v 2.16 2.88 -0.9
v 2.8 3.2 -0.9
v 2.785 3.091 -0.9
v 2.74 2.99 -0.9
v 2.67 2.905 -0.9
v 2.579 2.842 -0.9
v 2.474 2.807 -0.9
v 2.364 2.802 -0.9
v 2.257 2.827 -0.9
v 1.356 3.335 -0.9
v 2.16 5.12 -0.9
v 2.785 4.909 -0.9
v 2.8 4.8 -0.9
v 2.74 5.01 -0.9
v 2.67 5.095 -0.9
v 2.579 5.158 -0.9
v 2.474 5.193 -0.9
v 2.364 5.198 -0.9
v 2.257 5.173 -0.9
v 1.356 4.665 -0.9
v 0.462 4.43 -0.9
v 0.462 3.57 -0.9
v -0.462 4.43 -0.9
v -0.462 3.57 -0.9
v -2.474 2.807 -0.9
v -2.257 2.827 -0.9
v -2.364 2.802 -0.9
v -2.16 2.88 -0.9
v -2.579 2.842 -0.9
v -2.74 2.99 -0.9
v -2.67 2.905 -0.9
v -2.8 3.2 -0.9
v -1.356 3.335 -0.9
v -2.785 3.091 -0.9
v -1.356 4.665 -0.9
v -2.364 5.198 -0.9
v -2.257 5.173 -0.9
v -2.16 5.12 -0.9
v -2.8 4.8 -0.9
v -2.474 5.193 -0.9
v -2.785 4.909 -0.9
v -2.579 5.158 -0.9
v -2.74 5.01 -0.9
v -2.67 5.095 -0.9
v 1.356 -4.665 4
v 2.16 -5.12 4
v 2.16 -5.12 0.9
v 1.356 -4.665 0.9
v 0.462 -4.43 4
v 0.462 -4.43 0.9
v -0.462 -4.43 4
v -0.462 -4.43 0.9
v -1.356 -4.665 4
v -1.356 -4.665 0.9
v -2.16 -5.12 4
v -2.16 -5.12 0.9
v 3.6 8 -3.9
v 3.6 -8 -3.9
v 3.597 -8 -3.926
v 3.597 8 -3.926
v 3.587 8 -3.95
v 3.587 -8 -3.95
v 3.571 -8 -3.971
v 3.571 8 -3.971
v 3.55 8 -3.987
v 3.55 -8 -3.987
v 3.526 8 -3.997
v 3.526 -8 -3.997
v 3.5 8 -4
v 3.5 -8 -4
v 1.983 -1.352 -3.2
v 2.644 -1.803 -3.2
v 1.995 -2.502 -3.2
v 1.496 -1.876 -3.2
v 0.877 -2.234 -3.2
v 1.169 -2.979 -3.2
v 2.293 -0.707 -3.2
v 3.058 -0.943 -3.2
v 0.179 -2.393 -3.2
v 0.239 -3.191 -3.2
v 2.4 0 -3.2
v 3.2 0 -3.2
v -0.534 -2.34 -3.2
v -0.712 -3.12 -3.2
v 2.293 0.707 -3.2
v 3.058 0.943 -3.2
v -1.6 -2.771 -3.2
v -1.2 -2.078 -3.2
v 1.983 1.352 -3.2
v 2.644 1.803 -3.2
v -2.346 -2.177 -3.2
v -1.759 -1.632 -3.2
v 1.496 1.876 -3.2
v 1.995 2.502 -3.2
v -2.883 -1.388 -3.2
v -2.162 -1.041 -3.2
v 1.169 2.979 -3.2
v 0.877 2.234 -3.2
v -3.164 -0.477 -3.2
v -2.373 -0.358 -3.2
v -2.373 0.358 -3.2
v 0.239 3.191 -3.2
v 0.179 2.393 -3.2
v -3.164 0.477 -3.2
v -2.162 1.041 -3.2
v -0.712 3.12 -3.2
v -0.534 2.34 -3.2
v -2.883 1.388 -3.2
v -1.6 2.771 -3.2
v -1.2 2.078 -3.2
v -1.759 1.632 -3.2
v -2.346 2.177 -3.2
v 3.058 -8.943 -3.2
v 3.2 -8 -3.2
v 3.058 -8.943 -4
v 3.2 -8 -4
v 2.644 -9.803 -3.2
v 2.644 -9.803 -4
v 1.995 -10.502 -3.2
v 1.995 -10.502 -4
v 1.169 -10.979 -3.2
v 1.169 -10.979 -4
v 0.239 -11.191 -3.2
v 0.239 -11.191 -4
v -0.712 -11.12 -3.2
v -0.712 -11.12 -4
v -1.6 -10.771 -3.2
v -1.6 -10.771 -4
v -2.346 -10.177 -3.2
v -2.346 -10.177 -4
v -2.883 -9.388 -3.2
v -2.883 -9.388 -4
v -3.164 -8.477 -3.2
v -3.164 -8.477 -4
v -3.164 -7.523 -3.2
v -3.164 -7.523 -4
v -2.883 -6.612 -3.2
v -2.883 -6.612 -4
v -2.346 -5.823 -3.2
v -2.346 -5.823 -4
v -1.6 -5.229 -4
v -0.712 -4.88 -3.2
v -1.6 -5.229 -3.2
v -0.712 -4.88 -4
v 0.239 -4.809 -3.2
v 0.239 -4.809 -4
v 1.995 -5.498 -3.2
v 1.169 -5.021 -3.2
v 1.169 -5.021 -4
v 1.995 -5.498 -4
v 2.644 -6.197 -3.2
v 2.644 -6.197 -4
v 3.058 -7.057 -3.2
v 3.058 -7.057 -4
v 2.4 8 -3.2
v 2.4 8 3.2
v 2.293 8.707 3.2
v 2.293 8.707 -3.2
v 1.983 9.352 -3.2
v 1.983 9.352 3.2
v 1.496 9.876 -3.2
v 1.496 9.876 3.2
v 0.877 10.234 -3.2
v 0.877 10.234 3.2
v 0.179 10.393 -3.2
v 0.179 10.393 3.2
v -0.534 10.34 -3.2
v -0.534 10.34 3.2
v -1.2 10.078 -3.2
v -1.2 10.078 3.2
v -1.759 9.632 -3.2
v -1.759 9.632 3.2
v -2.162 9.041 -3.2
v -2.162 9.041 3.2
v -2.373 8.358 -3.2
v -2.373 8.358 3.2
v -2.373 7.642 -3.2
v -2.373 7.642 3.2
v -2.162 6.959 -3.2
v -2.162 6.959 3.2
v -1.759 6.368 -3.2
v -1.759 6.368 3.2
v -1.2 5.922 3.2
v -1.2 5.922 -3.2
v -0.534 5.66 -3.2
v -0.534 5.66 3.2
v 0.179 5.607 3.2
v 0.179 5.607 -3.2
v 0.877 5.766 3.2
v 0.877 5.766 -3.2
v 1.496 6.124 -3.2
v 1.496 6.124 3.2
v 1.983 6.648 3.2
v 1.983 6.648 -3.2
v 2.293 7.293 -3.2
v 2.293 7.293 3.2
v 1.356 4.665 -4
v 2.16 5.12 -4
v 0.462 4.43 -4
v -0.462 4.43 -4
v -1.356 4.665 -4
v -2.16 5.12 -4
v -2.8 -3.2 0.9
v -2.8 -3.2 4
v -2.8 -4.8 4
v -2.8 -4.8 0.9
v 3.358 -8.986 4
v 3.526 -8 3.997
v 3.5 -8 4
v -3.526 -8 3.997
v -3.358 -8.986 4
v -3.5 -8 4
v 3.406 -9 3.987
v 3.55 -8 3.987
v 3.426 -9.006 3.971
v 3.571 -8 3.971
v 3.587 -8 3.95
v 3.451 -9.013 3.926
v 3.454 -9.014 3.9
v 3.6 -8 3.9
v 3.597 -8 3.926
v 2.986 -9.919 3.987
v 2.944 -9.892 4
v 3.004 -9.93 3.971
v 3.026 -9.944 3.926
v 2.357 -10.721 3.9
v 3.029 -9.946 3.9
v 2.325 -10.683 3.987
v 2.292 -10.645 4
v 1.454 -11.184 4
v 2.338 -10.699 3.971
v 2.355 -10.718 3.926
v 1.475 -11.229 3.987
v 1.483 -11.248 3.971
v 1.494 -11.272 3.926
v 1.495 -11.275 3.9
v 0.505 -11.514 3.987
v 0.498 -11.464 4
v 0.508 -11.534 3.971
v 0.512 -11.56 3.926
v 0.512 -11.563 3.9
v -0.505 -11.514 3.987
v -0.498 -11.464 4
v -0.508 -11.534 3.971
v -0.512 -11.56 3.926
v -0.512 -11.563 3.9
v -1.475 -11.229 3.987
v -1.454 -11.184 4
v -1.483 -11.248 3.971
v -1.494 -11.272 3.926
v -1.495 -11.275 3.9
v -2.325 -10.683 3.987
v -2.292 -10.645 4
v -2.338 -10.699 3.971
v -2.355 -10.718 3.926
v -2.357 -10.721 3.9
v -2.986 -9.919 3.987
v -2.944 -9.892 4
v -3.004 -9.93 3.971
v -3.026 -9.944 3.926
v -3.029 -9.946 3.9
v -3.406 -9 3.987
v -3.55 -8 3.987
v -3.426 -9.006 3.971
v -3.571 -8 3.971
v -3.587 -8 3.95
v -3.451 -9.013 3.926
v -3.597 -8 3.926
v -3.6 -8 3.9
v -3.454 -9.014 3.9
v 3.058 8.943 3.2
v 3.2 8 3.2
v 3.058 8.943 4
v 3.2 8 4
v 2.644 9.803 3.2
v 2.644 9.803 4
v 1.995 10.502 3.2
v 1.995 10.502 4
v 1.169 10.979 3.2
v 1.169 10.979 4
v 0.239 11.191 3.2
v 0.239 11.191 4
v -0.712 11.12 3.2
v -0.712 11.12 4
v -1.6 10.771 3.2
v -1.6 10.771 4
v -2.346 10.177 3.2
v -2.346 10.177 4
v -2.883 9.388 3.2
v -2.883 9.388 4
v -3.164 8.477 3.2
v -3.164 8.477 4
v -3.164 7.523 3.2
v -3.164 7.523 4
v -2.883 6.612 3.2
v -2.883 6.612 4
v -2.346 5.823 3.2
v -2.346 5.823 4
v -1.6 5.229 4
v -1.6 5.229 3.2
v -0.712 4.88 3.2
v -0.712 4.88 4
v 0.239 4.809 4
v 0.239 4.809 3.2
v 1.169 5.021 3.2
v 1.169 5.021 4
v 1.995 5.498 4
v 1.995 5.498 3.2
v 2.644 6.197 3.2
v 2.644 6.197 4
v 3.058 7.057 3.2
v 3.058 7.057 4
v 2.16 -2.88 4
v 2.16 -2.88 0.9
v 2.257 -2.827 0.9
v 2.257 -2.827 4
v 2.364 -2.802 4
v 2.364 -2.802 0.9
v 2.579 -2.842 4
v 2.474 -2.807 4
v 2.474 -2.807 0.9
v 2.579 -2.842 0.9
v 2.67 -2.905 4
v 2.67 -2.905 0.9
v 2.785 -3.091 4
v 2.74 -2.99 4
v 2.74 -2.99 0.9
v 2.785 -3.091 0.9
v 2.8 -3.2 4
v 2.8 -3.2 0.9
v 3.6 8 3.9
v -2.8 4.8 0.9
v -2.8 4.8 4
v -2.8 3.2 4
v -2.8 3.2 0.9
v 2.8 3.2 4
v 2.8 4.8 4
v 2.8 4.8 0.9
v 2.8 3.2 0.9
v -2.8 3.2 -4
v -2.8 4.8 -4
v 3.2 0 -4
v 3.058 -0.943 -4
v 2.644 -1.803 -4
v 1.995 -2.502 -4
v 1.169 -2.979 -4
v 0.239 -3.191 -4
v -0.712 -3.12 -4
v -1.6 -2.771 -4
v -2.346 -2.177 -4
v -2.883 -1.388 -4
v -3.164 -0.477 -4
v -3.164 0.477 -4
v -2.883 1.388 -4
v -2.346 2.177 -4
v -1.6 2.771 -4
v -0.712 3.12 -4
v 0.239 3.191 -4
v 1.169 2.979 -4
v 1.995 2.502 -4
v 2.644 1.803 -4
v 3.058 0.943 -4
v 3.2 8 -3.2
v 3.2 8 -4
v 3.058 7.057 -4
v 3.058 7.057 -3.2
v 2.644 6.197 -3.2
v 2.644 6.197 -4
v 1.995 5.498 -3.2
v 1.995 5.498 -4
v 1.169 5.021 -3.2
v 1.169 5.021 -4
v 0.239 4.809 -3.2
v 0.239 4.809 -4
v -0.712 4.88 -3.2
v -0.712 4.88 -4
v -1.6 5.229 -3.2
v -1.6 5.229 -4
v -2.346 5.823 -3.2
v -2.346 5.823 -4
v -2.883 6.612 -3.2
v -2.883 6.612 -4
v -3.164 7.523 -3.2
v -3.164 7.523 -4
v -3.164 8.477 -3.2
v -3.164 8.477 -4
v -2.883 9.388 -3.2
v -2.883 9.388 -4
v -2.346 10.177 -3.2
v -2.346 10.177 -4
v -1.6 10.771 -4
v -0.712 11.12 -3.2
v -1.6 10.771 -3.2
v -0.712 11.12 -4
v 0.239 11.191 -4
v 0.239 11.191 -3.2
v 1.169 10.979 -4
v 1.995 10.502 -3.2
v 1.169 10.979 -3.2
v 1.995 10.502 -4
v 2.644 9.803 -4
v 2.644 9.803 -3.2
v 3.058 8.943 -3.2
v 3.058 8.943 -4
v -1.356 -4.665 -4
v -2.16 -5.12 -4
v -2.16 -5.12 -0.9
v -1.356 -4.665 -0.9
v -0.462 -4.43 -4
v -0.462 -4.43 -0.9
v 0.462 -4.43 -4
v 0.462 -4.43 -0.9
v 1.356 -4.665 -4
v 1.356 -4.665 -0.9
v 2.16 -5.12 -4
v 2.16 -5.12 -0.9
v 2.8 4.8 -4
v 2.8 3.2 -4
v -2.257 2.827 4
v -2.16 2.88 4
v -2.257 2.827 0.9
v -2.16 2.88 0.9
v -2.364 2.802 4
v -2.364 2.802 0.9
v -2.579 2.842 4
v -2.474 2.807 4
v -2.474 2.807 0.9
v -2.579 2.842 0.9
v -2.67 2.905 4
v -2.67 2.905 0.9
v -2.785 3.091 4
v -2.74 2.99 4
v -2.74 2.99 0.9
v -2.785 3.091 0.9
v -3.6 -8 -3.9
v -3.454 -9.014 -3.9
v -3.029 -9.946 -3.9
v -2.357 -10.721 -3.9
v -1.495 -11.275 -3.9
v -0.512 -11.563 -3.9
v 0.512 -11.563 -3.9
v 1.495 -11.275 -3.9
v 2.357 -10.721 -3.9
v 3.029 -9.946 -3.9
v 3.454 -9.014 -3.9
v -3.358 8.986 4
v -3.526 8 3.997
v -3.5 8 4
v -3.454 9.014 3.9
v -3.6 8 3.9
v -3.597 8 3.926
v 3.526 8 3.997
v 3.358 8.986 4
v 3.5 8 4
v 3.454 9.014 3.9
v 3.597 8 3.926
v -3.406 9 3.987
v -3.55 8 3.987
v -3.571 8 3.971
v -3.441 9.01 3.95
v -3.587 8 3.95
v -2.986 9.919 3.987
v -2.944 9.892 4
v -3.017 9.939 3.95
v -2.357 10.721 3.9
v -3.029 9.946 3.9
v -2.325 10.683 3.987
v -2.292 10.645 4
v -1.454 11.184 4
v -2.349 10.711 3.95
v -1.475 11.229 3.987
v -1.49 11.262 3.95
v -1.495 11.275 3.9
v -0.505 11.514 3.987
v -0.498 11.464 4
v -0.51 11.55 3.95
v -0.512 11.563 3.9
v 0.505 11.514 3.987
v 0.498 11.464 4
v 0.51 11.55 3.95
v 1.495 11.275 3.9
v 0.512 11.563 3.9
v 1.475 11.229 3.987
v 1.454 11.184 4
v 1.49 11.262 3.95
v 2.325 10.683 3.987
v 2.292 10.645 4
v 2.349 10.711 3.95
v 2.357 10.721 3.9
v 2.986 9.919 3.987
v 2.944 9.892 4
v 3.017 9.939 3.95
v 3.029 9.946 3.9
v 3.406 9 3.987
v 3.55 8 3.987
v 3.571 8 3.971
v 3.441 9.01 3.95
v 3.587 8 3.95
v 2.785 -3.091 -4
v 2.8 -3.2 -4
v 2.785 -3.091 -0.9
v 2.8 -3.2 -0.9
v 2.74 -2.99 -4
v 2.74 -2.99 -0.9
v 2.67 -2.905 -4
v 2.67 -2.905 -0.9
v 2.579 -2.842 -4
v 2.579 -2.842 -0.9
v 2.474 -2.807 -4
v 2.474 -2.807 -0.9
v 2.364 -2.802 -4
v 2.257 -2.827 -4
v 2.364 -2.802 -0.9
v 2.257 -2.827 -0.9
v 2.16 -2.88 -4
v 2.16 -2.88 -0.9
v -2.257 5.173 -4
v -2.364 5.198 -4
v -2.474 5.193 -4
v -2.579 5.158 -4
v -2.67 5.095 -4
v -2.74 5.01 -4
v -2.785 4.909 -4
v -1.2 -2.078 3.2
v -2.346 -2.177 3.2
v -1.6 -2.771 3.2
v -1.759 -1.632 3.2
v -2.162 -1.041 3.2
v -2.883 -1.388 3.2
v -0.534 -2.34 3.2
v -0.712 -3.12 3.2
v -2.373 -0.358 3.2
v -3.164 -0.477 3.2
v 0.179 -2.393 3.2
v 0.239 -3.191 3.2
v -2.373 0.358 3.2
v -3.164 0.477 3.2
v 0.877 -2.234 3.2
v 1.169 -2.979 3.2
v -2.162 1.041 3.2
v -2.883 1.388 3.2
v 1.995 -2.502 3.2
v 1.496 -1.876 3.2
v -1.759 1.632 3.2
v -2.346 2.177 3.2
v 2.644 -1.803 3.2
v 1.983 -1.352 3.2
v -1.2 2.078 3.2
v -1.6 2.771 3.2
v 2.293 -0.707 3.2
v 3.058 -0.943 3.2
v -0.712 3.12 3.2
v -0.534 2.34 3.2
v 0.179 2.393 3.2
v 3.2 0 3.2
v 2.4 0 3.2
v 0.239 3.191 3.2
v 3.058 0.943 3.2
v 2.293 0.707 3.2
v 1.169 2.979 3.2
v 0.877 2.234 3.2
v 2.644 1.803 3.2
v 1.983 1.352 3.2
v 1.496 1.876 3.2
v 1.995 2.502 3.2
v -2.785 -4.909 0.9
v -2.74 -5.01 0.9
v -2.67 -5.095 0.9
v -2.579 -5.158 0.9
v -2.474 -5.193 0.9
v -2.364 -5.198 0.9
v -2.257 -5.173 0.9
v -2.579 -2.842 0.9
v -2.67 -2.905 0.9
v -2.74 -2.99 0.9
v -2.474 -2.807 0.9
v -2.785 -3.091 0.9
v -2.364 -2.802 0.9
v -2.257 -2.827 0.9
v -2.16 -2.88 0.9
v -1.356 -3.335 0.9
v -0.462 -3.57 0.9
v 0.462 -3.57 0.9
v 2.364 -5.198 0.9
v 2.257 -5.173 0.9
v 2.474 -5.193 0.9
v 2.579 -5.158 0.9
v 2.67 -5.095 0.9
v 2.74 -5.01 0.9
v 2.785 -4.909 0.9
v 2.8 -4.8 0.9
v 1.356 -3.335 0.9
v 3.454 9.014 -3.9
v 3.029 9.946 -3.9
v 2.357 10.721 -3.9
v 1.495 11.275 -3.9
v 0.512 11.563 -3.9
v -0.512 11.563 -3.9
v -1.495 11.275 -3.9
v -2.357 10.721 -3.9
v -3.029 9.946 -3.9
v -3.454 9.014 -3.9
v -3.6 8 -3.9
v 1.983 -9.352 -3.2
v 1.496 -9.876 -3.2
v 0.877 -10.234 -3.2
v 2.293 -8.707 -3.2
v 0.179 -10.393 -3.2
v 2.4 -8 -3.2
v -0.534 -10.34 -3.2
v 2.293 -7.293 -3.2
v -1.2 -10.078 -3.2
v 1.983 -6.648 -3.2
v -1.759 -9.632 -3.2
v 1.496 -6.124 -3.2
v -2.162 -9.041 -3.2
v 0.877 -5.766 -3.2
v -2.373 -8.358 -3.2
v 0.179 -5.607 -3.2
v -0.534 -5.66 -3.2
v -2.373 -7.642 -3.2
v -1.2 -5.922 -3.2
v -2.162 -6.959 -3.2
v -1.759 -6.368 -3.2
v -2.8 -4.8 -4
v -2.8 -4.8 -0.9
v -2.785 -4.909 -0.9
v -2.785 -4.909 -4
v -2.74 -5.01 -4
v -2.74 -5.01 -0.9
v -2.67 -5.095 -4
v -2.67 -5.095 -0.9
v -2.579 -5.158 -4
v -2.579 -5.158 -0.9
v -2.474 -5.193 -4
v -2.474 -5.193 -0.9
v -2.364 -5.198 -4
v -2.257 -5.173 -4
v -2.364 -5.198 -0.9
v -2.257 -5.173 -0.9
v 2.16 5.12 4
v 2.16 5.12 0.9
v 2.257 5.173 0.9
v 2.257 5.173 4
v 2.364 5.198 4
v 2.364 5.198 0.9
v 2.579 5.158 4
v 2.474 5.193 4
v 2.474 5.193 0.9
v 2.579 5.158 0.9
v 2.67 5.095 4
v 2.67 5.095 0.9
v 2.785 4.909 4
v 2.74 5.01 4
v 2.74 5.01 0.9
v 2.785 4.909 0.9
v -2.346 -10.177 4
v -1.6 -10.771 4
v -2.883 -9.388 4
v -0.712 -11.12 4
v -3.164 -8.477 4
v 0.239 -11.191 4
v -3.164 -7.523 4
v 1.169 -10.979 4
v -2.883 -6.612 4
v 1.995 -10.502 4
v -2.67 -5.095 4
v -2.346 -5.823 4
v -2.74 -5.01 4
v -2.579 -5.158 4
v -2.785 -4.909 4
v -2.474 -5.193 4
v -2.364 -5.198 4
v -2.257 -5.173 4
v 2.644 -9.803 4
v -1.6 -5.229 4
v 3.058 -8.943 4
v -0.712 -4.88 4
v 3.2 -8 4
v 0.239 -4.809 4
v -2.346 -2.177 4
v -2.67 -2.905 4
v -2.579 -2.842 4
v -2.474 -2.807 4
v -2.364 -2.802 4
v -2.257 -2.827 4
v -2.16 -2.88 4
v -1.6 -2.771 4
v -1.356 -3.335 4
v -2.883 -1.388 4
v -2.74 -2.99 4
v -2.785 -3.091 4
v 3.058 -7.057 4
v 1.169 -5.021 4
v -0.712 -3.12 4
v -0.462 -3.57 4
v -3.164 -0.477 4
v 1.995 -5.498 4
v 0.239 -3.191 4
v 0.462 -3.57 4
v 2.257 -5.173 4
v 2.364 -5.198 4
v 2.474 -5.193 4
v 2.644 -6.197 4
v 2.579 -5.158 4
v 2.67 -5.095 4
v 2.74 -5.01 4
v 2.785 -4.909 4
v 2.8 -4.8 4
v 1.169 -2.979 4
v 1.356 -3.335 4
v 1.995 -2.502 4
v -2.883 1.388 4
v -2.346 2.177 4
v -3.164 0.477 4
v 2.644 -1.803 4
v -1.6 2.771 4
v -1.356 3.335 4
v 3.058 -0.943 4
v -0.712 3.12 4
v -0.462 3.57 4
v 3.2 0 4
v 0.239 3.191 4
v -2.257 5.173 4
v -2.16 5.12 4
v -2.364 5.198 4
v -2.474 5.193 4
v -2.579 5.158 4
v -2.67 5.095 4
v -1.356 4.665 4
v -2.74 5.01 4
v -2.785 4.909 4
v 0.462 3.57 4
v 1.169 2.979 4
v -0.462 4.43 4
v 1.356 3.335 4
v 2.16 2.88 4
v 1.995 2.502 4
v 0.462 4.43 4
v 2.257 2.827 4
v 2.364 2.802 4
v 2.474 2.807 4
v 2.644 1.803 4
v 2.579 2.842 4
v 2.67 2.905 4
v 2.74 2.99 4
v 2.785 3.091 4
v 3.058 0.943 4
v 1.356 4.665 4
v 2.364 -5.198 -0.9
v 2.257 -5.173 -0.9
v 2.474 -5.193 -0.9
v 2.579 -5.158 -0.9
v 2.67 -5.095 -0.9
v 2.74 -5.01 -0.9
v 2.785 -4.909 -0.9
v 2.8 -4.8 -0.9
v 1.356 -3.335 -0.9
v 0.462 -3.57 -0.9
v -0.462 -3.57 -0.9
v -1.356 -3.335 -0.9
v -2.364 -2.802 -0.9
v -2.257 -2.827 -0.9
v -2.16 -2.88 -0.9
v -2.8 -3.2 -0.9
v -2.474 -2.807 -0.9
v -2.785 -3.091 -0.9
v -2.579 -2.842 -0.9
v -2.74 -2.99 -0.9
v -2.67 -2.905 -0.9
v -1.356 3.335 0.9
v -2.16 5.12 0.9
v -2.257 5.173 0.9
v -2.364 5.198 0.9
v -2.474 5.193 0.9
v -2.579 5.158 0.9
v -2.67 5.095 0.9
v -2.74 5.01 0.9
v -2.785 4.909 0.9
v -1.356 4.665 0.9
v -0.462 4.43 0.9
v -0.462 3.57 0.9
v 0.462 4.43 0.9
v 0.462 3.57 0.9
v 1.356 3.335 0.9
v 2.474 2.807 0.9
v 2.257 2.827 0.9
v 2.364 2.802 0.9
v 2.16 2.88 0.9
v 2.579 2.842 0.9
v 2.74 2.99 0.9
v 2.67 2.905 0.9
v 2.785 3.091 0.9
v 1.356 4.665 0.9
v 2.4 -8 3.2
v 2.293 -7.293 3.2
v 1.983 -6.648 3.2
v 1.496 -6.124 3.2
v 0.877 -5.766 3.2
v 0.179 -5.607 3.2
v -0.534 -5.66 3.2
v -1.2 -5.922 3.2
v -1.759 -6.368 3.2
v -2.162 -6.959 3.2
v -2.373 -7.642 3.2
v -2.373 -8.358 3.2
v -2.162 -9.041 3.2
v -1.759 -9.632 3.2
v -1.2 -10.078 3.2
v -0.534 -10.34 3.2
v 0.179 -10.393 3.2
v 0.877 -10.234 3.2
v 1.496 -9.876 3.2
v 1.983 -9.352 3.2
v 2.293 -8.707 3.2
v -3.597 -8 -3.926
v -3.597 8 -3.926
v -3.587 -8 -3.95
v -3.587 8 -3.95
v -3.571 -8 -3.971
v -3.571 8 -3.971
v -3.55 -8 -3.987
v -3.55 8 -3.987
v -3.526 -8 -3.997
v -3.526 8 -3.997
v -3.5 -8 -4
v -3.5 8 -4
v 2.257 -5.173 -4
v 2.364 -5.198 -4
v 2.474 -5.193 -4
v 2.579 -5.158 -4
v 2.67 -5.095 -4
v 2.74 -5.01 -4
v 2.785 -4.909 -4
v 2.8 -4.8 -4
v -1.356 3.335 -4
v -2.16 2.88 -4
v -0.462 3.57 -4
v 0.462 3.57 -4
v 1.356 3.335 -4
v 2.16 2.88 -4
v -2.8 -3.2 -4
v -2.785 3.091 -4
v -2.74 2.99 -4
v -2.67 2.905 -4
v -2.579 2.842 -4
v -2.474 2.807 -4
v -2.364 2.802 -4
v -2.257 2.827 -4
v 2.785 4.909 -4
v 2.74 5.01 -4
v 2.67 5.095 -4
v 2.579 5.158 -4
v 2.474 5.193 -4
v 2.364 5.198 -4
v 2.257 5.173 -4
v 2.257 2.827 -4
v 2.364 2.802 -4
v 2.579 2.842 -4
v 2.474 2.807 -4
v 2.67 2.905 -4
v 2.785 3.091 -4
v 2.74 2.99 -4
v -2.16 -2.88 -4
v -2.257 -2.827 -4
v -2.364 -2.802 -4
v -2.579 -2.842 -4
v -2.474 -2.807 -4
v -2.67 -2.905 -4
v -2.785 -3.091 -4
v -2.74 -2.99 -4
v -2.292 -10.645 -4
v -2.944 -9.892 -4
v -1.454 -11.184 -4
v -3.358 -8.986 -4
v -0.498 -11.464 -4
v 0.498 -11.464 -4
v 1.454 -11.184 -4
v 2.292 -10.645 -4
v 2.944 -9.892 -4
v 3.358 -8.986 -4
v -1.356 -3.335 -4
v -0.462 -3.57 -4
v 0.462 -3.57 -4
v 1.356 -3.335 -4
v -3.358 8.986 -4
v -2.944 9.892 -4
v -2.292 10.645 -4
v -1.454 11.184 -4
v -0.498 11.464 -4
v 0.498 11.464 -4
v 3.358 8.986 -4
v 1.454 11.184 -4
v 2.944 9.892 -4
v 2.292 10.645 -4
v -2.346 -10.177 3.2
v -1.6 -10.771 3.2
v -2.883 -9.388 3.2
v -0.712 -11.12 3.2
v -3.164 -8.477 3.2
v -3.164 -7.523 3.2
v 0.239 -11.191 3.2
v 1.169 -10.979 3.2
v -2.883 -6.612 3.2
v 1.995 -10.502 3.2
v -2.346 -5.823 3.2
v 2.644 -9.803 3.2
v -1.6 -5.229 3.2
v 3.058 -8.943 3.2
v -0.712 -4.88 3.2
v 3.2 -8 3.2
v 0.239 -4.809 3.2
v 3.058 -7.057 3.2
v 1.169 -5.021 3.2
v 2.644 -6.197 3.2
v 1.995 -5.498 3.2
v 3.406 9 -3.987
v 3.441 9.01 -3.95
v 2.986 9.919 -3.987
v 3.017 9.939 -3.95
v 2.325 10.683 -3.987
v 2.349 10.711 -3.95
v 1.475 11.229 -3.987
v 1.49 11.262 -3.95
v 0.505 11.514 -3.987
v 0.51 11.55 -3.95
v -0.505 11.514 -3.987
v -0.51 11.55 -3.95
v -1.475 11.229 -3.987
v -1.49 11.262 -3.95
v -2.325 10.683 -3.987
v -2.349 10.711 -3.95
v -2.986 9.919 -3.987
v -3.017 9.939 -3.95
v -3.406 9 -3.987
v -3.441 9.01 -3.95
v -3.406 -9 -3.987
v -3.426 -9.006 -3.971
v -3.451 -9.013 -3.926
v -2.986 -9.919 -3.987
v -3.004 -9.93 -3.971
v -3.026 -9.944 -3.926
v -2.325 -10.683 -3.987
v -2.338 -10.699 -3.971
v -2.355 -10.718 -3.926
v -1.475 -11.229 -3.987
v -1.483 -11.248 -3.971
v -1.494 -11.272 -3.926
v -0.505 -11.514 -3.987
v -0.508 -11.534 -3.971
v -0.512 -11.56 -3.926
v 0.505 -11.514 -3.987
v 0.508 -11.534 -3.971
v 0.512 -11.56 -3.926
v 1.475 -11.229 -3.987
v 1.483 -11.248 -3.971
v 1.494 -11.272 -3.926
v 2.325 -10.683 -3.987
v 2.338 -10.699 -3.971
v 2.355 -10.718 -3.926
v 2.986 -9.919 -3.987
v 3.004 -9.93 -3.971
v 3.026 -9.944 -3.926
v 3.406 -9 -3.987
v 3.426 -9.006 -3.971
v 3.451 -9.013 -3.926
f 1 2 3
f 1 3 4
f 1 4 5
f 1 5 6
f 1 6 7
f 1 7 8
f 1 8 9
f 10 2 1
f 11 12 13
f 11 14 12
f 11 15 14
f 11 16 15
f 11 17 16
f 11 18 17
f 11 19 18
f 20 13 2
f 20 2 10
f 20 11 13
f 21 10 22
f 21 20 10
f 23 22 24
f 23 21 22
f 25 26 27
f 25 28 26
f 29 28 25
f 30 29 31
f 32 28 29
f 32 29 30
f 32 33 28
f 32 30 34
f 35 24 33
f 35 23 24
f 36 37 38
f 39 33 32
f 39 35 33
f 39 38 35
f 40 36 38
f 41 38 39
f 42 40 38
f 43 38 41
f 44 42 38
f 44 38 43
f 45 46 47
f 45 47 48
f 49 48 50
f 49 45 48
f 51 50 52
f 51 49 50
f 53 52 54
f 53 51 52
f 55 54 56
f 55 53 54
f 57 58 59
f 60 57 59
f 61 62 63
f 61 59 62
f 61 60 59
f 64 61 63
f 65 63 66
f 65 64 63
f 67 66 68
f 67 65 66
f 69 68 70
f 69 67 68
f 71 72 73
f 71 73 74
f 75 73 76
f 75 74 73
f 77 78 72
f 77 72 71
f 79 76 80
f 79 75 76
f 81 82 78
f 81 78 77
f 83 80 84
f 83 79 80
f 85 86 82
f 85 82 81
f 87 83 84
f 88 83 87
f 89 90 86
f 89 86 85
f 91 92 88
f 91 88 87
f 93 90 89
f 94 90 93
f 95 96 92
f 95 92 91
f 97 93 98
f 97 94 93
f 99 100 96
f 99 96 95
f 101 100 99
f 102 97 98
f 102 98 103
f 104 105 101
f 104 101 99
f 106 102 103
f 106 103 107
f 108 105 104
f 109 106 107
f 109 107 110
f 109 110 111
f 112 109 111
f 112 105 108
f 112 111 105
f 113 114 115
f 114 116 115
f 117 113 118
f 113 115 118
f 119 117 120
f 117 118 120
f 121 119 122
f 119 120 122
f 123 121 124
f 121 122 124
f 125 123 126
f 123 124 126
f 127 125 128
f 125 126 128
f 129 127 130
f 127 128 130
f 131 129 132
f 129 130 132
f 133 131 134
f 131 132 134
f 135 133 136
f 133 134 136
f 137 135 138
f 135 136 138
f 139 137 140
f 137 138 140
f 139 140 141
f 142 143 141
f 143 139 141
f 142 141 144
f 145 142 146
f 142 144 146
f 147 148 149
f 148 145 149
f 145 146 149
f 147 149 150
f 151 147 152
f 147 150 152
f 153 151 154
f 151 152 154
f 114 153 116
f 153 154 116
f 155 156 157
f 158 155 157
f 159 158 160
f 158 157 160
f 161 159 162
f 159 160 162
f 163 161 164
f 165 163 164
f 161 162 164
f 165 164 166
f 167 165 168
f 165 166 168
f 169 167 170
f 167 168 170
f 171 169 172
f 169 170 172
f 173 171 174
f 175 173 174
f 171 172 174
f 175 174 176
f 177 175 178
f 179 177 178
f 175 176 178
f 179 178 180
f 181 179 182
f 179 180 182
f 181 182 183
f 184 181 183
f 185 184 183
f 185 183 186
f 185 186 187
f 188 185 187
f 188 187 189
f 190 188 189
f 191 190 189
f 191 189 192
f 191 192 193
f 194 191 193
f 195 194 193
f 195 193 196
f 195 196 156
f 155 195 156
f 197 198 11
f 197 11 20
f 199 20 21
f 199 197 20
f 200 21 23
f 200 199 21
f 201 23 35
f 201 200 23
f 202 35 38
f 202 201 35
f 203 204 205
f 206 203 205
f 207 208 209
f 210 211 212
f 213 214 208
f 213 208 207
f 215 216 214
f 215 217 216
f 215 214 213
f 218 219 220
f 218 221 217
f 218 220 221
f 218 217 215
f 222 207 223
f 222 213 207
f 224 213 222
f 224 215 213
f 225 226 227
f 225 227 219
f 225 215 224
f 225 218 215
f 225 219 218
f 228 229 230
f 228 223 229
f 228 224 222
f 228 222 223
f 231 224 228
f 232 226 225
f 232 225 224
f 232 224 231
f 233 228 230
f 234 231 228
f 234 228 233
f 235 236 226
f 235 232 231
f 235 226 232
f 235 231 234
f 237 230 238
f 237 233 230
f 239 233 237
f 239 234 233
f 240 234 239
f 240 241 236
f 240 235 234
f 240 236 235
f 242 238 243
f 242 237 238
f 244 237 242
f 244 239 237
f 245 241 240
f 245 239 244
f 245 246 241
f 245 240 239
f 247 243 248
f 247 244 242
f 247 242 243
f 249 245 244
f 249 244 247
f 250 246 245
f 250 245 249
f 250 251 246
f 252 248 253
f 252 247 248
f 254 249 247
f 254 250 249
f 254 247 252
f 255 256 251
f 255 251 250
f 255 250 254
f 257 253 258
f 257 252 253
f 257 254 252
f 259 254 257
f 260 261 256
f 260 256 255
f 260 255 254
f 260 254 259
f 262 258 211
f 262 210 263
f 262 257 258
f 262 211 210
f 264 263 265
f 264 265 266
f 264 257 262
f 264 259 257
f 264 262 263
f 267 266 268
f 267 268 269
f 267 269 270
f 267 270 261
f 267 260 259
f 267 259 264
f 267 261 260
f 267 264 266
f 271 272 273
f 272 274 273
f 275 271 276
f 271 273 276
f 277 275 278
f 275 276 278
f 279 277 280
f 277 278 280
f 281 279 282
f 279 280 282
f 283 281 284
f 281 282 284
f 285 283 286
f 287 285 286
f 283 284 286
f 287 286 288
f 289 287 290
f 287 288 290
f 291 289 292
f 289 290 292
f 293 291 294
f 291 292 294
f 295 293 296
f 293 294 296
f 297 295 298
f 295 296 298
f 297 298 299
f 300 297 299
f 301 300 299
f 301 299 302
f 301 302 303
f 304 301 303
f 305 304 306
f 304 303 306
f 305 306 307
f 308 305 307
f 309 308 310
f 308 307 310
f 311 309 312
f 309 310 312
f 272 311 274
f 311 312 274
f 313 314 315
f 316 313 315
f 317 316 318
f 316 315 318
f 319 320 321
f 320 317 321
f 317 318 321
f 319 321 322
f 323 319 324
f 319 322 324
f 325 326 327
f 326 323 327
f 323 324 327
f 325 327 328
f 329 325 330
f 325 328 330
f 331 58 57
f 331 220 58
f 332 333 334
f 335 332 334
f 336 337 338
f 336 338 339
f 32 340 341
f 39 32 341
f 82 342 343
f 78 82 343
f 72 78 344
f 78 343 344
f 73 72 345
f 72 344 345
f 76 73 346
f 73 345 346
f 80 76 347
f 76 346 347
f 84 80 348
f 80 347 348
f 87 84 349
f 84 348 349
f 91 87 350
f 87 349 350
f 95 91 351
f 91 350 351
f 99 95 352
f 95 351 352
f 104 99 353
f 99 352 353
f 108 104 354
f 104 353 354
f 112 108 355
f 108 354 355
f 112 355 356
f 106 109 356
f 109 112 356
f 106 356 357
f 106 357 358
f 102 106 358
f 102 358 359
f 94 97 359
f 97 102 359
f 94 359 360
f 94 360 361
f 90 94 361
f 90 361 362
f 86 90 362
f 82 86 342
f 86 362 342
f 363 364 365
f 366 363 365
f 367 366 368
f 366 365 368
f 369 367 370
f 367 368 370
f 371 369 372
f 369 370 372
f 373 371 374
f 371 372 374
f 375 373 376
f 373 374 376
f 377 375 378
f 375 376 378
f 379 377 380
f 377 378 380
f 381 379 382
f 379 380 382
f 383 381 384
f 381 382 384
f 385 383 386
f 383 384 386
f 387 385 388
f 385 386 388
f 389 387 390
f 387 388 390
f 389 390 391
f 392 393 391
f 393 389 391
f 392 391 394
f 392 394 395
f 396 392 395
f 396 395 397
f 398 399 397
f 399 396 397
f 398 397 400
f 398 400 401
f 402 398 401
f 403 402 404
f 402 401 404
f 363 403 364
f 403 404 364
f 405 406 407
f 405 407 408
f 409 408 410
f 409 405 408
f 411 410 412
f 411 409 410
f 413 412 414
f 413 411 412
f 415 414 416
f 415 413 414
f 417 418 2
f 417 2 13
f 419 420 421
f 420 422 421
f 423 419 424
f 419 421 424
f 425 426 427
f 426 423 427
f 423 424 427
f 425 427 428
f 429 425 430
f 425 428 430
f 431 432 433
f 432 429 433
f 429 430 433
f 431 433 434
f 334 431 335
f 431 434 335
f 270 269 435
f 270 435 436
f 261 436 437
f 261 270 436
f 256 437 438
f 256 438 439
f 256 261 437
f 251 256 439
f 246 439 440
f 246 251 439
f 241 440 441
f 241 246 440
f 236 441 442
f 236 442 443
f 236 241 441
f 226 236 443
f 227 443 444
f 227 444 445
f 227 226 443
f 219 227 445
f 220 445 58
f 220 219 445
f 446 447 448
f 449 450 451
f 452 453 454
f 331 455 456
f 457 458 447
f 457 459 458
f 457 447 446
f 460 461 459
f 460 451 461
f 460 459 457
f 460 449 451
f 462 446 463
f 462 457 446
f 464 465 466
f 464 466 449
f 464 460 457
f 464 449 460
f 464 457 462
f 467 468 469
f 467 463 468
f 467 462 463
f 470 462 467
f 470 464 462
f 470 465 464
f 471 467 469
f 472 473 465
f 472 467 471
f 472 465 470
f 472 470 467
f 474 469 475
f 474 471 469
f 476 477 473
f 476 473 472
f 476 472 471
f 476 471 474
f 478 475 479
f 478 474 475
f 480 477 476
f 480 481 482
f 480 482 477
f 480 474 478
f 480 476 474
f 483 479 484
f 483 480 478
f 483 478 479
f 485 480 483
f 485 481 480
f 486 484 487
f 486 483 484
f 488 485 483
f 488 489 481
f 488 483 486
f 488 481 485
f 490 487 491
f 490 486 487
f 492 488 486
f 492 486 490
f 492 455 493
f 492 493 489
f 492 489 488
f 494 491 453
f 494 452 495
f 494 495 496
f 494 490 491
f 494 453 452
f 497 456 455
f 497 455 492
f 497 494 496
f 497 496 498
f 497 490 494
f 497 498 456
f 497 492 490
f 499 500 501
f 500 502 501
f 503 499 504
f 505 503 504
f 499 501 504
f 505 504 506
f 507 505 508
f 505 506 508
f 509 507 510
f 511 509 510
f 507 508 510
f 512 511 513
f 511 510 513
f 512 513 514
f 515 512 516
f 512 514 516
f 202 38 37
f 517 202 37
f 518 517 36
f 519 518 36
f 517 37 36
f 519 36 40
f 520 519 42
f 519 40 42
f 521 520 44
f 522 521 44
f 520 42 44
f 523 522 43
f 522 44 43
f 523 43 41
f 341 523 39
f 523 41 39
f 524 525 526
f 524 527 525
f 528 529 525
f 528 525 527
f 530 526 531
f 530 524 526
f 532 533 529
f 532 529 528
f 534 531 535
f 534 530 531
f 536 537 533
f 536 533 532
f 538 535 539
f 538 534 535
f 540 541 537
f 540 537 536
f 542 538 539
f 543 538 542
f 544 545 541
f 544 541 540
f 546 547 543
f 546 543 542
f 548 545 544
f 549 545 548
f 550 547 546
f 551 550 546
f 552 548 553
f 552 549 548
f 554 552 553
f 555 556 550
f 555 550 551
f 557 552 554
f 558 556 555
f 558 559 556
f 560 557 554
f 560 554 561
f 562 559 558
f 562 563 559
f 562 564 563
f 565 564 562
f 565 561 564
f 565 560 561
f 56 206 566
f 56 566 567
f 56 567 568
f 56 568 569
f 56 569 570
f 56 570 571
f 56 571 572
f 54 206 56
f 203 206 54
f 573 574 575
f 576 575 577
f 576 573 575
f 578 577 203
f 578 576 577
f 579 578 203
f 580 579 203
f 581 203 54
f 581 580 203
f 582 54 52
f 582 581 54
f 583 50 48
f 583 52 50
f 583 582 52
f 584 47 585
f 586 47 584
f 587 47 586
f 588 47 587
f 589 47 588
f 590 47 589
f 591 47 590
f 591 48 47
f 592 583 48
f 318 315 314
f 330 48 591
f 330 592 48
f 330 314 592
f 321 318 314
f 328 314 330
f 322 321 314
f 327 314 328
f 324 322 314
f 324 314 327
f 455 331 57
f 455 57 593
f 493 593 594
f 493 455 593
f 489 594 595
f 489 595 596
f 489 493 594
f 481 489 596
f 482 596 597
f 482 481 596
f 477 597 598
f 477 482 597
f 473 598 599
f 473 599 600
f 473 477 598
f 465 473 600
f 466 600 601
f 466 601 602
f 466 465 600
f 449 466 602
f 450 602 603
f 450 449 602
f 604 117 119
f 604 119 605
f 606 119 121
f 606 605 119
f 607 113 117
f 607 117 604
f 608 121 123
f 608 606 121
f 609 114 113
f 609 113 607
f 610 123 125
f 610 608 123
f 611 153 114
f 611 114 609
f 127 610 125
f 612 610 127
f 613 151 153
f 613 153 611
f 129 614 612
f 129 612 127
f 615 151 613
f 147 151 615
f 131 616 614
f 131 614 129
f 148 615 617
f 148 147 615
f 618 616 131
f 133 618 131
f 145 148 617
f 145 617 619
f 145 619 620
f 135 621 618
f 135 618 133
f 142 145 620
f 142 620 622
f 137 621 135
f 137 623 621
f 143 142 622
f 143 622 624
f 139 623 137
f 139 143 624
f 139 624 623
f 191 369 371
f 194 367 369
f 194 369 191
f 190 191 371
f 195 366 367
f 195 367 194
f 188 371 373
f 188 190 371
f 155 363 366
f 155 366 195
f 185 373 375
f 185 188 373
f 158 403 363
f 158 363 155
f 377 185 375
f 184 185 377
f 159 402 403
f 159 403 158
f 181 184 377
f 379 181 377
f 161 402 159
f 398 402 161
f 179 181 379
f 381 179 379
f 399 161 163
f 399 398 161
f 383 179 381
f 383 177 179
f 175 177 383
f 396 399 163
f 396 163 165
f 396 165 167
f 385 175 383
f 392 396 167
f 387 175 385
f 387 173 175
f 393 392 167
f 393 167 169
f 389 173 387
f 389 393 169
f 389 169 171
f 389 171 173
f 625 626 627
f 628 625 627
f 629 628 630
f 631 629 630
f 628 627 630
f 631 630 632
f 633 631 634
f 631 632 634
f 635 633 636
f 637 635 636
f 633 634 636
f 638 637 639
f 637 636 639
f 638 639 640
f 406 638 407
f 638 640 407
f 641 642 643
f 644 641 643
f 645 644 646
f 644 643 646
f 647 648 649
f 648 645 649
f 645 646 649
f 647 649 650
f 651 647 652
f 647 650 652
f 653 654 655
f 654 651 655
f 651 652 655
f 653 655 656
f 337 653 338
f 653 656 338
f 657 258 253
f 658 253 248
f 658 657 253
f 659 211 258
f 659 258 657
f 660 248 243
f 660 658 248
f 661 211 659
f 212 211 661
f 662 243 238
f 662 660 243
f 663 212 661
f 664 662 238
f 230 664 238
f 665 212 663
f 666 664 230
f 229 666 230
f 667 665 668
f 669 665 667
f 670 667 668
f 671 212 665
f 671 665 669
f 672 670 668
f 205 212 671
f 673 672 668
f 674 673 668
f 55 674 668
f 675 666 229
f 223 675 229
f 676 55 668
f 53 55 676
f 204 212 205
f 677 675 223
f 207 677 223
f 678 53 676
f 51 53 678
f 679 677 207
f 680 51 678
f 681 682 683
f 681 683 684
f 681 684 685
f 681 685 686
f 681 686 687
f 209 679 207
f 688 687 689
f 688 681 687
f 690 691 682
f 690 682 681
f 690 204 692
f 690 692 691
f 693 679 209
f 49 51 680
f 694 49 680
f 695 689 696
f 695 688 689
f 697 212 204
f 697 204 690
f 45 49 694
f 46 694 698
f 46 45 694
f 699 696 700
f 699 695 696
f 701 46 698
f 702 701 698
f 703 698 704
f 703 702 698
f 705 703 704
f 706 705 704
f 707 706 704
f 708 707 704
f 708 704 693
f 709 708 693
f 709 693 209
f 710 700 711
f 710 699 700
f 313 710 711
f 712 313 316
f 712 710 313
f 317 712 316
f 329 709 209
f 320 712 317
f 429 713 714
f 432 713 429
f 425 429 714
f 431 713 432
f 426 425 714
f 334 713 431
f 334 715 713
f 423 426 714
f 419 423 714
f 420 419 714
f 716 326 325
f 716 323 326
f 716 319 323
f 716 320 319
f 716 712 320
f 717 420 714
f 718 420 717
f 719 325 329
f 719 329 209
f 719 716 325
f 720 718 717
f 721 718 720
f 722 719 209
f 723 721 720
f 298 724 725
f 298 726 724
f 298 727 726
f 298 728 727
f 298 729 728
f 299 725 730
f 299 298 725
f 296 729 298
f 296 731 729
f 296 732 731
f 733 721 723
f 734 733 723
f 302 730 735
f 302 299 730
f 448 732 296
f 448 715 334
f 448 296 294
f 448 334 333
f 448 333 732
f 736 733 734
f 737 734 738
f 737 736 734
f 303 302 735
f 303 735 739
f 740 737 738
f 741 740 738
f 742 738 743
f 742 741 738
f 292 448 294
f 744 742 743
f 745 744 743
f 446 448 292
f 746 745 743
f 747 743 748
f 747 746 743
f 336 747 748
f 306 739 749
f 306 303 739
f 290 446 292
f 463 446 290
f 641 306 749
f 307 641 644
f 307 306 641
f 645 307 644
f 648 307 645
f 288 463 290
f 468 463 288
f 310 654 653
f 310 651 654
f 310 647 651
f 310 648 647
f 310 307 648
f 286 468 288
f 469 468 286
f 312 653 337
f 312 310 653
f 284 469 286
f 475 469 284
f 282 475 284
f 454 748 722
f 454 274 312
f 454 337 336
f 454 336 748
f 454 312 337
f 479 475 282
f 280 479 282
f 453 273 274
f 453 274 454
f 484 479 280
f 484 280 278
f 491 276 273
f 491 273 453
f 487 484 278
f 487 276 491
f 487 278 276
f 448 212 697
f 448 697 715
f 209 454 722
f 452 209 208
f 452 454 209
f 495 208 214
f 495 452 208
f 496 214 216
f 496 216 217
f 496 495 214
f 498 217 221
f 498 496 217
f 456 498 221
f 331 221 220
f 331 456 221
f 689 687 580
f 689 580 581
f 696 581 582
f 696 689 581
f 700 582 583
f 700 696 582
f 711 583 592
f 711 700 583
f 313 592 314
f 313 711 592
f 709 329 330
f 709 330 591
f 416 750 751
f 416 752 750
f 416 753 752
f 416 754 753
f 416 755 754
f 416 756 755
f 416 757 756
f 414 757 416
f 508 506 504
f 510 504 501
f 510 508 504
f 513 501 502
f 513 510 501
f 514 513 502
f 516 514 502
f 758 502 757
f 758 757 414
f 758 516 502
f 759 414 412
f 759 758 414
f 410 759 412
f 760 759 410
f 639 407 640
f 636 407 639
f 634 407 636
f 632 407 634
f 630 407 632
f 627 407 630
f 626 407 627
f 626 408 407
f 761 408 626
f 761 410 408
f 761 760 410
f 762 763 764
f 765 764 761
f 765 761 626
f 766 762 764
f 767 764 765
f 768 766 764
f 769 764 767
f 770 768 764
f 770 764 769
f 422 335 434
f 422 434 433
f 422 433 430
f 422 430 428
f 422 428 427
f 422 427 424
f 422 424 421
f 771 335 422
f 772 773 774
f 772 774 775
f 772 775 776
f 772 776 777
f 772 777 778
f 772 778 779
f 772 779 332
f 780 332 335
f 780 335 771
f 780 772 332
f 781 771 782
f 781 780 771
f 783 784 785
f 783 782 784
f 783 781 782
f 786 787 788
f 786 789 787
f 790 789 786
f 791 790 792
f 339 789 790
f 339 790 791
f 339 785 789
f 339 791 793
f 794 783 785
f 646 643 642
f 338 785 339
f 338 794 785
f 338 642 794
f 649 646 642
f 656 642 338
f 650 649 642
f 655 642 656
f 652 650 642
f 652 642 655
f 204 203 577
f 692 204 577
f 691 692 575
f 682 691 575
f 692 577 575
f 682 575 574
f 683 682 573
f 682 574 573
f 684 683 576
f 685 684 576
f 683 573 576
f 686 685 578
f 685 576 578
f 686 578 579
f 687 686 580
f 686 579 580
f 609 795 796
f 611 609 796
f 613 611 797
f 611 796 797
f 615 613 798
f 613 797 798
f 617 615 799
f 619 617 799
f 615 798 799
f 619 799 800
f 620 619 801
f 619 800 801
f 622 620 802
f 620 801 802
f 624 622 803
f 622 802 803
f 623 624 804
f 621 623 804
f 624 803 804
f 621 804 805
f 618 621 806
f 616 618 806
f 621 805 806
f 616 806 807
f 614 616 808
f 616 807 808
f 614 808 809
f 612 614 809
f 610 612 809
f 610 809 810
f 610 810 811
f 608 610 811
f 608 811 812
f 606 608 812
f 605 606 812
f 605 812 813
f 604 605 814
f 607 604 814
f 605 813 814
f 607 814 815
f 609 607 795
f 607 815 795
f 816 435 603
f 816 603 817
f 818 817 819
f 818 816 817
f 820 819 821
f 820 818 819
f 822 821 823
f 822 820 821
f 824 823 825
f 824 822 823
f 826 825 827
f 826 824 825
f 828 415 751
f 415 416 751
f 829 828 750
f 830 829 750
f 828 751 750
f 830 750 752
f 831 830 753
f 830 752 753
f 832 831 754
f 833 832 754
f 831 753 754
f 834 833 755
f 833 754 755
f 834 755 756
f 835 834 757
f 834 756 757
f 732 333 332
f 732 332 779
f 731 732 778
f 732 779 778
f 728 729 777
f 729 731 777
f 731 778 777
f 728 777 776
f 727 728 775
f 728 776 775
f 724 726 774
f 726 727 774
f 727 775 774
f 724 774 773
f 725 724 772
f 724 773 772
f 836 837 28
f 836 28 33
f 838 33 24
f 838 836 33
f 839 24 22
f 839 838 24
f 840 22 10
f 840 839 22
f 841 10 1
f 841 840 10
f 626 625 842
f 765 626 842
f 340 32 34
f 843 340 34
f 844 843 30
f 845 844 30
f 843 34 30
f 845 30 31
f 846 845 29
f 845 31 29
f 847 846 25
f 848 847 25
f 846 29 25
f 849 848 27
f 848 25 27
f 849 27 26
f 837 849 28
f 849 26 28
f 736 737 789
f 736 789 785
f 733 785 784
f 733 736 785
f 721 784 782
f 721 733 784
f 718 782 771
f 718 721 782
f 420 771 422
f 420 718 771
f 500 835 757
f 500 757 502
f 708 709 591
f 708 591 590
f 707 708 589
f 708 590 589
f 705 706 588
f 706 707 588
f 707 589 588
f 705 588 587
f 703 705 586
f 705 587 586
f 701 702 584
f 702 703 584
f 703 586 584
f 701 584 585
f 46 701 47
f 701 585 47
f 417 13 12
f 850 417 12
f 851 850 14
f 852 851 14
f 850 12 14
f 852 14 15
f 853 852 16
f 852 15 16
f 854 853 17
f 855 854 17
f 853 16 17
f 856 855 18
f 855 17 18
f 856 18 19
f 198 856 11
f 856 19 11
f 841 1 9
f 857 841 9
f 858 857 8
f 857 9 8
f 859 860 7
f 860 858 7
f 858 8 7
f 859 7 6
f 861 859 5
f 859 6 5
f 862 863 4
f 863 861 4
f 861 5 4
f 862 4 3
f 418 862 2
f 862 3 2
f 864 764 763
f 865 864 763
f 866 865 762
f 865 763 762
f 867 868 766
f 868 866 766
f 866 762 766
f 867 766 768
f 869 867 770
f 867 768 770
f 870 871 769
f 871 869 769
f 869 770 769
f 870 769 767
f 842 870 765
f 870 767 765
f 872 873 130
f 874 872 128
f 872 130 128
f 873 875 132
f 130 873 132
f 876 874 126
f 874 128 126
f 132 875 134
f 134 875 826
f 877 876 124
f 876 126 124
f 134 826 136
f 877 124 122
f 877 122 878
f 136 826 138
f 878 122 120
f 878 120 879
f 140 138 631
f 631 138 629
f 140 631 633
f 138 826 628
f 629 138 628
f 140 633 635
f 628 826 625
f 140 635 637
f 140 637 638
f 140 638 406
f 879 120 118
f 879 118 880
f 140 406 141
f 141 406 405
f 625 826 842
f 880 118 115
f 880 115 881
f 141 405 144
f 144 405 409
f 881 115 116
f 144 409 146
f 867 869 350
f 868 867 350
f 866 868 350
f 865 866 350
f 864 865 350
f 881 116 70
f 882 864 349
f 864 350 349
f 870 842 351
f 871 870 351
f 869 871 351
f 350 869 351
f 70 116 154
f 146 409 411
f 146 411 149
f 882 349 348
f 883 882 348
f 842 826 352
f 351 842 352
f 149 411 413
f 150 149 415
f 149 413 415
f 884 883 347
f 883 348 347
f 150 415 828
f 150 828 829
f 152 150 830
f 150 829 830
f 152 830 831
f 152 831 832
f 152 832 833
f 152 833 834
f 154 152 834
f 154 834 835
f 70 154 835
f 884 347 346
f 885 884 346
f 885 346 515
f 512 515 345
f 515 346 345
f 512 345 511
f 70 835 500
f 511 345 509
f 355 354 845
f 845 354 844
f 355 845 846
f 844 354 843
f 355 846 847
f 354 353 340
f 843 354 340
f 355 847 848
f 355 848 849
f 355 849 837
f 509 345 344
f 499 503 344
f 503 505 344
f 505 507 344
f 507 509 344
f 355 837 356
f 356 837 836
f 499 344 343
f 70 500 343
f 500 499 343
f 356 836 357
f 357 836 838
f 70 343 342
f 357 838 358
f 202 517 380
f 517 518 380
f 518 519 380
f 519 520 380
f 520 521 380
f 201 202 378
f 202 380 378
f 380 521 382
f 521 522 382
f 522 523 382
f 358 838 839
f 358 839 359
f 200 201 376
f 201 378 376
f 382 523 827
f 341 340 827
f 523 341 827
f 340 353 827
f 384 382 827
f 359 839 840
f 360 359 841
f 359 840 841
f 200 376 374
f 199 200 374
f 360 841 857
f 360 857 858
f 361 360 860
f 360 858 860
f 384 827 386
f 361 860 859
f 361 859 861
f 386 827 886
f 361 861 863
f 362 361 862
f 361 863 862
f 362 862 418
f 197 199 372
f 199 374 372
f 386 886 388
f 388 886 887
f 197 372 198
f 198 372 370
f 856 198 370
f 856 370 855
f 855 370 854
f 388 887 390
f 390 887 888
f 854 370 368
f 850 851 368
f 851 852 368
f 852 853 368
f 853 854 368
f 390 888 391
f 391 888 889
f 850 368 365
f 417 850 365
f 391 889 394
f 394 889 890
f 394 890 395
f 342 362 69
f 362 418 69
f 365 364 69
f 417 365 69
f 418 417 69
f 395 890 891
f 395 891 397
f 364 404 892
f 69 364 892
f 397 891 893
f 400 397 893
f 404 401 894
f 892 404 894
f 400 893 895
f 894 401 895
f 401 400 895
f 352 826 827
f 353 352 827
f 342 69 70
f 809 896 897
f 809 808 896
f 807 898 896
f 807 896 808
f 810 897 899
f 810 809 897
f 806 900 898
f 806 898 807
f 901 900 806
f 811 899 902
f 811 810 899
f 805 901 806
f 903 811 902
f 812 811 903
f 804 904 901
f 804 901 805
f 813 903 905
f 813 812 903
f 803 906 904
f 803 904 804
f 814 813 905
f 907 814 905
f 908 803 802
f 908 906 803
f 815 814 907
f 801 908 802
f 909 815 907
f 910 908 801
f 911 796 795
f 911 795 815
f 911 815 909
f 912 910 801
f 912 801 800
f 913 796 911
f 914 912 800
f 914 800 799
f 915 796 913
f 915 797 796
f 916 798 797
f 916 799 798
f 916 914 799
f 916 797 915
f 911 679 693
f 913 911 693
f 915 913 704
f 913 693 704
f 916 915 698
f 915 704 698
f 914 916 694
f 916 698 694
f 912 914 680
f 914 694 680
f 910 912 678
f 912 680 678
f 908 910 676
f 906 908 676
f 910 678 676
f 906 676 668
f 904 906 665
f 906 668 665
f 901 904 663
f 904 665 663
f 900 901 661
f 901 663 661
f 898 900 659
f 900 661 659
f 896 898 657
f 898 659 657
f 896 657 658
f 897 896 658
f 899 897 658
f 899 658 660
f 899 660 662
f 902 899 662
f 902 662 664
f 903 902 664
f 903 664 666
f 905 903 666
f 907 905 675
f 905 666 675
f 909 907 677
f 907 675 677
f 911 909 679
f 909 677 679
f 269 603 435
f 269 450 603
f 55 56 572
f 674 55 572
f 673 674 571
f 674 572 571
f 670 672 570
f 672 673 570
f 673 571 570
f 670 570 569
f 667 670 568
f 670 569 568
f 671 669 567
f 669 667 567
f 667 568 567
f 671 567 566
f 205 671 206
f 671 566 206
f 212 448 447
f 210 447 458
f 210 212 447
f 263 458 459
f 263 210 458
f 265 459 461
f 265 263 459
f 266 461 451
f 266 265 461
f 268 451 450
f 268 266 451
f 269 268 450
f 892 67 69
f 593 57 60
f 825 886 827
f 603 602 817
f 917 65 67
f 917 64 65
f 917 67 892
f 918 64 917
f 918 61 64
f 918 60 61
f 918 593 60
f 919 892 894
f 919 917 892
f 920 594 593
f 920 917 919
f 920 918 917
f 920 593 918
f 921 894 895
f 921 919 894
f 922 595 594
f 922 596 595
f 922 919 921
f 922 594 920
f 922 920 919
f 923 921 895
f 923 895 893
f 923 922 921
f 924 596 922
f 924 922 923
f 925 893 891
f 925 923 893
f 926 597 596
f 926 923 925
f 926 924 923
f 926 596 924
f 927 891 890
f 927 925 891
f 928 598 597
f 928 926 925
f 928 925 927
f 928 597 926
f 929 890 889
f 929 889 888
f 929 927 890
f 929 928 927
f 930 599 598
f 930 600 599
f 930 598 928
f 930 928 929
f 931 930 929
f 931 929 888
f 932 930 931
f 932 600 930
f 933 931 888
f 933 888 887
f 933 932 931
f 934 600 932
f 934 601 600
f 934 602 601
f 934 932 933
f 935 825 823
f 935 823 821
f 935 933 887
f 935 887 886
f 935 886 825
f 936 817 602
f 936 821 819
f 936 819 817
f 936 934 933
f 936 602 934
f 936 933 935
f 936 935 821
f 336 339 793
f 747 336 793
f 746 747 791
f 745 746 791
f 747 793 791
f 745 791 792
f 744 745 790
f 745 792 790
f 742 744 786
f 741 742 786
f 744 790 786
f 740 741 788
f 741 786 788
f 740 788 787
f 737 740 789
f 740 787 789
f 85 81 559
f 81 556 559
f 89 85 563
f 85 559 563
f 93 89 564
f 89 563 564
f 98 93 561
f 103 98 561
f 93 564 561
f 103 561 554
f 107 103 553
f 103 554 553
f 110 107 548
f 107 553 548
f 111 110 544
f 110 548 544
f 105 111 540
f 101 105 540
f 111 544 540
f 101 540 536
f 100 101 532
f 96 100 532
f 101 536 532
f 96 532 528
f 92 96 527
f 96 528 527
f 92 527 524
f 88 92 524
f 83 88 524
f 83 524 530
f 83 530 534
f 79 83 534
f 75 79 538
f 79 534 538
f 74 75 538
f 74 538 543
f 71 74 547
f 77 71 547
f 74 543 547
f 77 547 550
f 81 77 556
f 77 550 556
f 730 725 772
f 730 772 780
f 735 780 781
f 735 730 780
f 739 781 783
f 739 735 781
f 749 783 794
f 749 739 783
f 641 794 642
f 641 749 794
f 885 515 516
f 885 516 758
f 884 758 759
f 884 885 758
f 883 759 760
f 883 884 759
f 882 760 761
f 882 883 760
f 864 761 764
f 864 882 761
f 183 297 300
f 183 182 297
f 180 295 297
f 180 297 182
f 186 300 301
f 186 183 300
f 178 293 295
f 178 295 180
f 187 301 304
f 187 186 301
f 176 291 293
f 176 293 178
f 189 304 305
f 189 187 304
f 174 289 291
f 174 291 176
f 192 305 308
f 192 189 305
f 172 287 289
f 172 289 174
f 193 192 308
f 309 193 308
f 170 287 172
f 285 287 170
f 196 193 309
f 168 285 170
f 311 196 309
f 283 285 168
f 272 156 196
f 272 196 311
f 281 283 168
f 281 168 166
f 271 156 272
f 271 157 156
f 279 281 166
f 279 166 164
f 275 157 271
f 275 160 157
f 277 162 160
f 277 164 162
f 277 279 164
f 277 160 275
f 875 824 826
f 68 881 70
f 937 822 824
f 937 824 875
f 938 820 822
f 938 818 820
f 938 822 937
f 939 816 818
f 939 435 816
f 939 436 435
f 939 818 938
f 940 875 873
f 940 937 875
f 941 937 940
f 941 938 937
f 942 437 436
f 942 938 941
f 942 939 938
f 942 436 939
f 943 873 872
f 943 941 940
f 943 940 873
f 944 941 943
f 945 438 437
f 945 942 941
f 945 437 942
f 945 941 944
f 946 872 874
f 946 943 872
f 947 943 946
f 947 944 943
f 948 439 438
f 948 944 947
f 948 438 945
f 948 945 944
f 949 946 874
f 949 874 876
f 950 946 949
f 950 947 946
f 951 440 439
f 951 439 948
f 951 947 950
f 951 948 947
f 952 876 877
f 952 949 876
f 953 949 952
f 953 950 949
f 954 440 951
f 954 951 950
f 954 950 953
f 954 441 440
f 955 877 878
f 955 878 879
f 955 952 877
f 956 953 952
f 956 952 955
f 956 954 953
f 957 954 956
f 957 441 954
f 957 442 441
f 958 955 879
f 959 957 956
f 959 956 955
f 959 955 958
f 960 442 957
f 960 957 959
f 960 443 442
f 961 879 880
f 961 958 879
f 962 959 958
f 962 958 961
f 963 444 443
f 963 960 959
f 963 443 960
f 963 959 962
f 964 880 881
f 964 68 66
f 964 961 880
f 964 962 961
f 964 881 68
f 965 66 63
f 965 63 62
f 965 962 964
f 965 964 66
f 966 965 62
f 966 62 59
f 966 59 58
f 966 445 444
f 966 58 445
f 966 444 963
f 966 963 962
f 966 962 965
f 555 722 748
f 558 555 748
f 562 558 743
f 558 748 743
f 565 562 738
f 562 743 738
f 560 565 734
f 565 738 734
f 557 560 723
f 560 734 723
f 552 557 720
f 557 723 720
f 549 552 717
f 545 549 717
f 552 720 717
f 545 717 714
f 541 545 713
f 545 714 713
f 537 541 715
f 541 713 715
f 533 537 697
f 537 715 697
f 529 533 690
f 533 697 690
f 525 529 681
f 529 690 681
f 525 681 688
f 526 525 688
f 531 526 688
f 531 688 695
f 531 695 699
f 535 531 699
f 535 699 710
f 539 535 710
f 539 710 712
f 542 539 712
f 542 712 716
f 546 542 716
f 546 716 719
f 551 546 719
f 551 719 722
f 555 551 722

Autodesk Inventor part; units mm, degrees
ref_plane "YZ Plane" through (0, 0, 0) normal (1, 0, 0) x (0, 1, 0)
ref_plane "XZ Plane" through (0, 0, 0) normal (0, 1, 0) x (-1, 0, 0)
ref_plane "XY Plane" through (0, 0, 0) normal (0, 0, 1) x (1, 0, 0)
sketch "Sketch1" plane through (0, 0, 0) normal (0, 0, 1) x (1, 0, 0)
  line L0 (3.6, -8) -> (3.6, 8)
  line L1 (-3.6, 8) -> (-3.6, -8)
  arc A0 (3.6, 8) -> (-3.6, 8) centre (0, 8) ccw
  circle A1 centre (0, 8) radius 2.4
  circle A2 centre (0, 8) radius 3.2
  circle A3 centre (0, 0) radius 3.2
  circle A4 centre (0, 0) radius 2.4
  line L2 (0, 0) -> (0, 8) construction
  line L3 (-2.8, 5.7373) -> (-2.8, 2.2627)
  line L4 (2.8, 5.7373) -> (2.8, 2.2627)
  arc A5 (-2.8, 5.7373) -> (2.8, 5.7373) centre (0, 8) ccw
  arc A6 (2.8, 2.2627) -> (-2.8, 2.2627) centre (0, 0) ccw
  arc A7 (-3.6, -8) -> (3.6, -8) centre (0, -8) ccw
  circle A8 centre (0, -8) radius 3.2
  circle A9 centre (0, -8) radius 2.4
  line L5 (0, 0) -> (0, -8) construction
  line L6 (-2.8, -2.2627) -> (-2.8, -5.7373)
  line L7 (2.8, -2.2627) -> (2.8, -5.7373)
  arc A10 (-2.8, -2.2627) -> (2.8, -2.2627) centre (0, 0) ccw
  arc A11 (2.8, -5.7373) -> (-2.8, -5.7373) centre (0, -8) ccw
  dimension "d8" = 4.8
  dimension "d9" = 6.4
  dimension "d32" = 7.2
  dimension "d34" = 8
  dimension "d36" = 0.8
extrude "Extrusion1" add sketch "Sketch1" along normal mid plane 8 contours A7 L1 A0 L0 | A2 | A3 | A5 L4 A6 L3 | A8 | A10 L7 A11 L6
sketch "Sketch6" plane through (0, 0, 4) normal (0, 0, 1) x (1, 0, 0)
  circle A0 centre (0, 0) radius 2.4 projected
  circle A1 centre (0, 8) radius 2.4 projected
  circle A2 centre (0, 0) radius 3.2 projected
  circle A3 centre (0, 8) radius 3.2 projected
  arc A4 (2.8, 2.2627) -> (-2.8, 2.2627) centre (0, 0) ccw projected
  line L0 (-2.8, 5.7373) -> (-2.8, 2.2627) projected
  arc A5 (-2.8, 5.7373) -> (2.8, 5.7373) centre (0, 8) ccw projected
  line L1 (2.8, 5.7373) -> (2.8, 2.2627) projected
  line L2 (-2.8, -2.2627) -> (-2.8, -5.7373) projected
  arc A6 (-2.8, -2.2627) -> (2.8, -2.2627) centre (0, 0) ccw projected
  arc A7 (2.8, -5.7373) -> (-2.8, -5.7373) centre (0, -8) ccw projected
  line L3 (2.8, -2.2627) -> (2.8, -5.7373) projected
  circle A8 centre (0, -8) radius 3.2 projected
  circle A9 centre (0, -8) radius 2.4 projected
extrude "Extrusion7" cut sketch "Sketch6" against normal blind 0.8 contours A2 | A3 | A8
extrude "Extrusion8" cut sketch "Sketch6" against normal blind 3.1 contours A4 L0 A5 L1 | A6 L3 A7 L2
mirror "Mirror1" about plane through (0, 0, 0) normal (0, 0, 1) of "Extrusion7", "Extrusion8"
fillet "Fillet1" radius 0.1 6 edges at (0, 11.6, 4) (3.6, 0, 4) (-3.6, 0, 4) (0, 11.6, -4) (-3.6, 0, -4) (3.6, 0, -4)
fillet "Fillet1" radius 0.4 16 edges at (-2.8, 2.2627, 2.45) (-2.8, 5.7373, 2.45) (2.8, 2.2627, 2.45) (2.8, 5.7373, 2.45) (2.8, 5.7373, -2.45) (2.8, 2.2627, -2.45) (-2.8, 2.2627, -2.45) (-2.8, 5.7373, -2.45) (-2.8, -2.2627, 2.45) (-2.8, -5.7373, 2.45) (2.8, -5.7373, 2.45) (2.8, -2.2627, 2.45) (2.8, -2.2627, -2.45) (2.8, -5.7373, -2.45) (-2.8, -5.7373, -2.45) (-2.8, -2.2627, -2.45)
equation "\"d8\" = tpd"
equation "\"d9\" = tsd"
equation "\"d32\" = tlad"
equation "\"d34\" = lu"
equation "\"d14\" = lu"
equation "\"d41\" = tsl"
equation "\"d45\" = lf"
equation "\"d46\" = tf"
equation "\"tpd\" = 4.8"
equation "\"tsd\" = 6.4"
equation "\"tlad\" = 7.2"
equation "\"lu\" = 8"
equation "\"tsl\" = 0.8"
equation "\"lf\" = 0.1"
equation "\"tf\" = 0.4"
properties part number "32523-Yellow" material "ABS Plastic"
